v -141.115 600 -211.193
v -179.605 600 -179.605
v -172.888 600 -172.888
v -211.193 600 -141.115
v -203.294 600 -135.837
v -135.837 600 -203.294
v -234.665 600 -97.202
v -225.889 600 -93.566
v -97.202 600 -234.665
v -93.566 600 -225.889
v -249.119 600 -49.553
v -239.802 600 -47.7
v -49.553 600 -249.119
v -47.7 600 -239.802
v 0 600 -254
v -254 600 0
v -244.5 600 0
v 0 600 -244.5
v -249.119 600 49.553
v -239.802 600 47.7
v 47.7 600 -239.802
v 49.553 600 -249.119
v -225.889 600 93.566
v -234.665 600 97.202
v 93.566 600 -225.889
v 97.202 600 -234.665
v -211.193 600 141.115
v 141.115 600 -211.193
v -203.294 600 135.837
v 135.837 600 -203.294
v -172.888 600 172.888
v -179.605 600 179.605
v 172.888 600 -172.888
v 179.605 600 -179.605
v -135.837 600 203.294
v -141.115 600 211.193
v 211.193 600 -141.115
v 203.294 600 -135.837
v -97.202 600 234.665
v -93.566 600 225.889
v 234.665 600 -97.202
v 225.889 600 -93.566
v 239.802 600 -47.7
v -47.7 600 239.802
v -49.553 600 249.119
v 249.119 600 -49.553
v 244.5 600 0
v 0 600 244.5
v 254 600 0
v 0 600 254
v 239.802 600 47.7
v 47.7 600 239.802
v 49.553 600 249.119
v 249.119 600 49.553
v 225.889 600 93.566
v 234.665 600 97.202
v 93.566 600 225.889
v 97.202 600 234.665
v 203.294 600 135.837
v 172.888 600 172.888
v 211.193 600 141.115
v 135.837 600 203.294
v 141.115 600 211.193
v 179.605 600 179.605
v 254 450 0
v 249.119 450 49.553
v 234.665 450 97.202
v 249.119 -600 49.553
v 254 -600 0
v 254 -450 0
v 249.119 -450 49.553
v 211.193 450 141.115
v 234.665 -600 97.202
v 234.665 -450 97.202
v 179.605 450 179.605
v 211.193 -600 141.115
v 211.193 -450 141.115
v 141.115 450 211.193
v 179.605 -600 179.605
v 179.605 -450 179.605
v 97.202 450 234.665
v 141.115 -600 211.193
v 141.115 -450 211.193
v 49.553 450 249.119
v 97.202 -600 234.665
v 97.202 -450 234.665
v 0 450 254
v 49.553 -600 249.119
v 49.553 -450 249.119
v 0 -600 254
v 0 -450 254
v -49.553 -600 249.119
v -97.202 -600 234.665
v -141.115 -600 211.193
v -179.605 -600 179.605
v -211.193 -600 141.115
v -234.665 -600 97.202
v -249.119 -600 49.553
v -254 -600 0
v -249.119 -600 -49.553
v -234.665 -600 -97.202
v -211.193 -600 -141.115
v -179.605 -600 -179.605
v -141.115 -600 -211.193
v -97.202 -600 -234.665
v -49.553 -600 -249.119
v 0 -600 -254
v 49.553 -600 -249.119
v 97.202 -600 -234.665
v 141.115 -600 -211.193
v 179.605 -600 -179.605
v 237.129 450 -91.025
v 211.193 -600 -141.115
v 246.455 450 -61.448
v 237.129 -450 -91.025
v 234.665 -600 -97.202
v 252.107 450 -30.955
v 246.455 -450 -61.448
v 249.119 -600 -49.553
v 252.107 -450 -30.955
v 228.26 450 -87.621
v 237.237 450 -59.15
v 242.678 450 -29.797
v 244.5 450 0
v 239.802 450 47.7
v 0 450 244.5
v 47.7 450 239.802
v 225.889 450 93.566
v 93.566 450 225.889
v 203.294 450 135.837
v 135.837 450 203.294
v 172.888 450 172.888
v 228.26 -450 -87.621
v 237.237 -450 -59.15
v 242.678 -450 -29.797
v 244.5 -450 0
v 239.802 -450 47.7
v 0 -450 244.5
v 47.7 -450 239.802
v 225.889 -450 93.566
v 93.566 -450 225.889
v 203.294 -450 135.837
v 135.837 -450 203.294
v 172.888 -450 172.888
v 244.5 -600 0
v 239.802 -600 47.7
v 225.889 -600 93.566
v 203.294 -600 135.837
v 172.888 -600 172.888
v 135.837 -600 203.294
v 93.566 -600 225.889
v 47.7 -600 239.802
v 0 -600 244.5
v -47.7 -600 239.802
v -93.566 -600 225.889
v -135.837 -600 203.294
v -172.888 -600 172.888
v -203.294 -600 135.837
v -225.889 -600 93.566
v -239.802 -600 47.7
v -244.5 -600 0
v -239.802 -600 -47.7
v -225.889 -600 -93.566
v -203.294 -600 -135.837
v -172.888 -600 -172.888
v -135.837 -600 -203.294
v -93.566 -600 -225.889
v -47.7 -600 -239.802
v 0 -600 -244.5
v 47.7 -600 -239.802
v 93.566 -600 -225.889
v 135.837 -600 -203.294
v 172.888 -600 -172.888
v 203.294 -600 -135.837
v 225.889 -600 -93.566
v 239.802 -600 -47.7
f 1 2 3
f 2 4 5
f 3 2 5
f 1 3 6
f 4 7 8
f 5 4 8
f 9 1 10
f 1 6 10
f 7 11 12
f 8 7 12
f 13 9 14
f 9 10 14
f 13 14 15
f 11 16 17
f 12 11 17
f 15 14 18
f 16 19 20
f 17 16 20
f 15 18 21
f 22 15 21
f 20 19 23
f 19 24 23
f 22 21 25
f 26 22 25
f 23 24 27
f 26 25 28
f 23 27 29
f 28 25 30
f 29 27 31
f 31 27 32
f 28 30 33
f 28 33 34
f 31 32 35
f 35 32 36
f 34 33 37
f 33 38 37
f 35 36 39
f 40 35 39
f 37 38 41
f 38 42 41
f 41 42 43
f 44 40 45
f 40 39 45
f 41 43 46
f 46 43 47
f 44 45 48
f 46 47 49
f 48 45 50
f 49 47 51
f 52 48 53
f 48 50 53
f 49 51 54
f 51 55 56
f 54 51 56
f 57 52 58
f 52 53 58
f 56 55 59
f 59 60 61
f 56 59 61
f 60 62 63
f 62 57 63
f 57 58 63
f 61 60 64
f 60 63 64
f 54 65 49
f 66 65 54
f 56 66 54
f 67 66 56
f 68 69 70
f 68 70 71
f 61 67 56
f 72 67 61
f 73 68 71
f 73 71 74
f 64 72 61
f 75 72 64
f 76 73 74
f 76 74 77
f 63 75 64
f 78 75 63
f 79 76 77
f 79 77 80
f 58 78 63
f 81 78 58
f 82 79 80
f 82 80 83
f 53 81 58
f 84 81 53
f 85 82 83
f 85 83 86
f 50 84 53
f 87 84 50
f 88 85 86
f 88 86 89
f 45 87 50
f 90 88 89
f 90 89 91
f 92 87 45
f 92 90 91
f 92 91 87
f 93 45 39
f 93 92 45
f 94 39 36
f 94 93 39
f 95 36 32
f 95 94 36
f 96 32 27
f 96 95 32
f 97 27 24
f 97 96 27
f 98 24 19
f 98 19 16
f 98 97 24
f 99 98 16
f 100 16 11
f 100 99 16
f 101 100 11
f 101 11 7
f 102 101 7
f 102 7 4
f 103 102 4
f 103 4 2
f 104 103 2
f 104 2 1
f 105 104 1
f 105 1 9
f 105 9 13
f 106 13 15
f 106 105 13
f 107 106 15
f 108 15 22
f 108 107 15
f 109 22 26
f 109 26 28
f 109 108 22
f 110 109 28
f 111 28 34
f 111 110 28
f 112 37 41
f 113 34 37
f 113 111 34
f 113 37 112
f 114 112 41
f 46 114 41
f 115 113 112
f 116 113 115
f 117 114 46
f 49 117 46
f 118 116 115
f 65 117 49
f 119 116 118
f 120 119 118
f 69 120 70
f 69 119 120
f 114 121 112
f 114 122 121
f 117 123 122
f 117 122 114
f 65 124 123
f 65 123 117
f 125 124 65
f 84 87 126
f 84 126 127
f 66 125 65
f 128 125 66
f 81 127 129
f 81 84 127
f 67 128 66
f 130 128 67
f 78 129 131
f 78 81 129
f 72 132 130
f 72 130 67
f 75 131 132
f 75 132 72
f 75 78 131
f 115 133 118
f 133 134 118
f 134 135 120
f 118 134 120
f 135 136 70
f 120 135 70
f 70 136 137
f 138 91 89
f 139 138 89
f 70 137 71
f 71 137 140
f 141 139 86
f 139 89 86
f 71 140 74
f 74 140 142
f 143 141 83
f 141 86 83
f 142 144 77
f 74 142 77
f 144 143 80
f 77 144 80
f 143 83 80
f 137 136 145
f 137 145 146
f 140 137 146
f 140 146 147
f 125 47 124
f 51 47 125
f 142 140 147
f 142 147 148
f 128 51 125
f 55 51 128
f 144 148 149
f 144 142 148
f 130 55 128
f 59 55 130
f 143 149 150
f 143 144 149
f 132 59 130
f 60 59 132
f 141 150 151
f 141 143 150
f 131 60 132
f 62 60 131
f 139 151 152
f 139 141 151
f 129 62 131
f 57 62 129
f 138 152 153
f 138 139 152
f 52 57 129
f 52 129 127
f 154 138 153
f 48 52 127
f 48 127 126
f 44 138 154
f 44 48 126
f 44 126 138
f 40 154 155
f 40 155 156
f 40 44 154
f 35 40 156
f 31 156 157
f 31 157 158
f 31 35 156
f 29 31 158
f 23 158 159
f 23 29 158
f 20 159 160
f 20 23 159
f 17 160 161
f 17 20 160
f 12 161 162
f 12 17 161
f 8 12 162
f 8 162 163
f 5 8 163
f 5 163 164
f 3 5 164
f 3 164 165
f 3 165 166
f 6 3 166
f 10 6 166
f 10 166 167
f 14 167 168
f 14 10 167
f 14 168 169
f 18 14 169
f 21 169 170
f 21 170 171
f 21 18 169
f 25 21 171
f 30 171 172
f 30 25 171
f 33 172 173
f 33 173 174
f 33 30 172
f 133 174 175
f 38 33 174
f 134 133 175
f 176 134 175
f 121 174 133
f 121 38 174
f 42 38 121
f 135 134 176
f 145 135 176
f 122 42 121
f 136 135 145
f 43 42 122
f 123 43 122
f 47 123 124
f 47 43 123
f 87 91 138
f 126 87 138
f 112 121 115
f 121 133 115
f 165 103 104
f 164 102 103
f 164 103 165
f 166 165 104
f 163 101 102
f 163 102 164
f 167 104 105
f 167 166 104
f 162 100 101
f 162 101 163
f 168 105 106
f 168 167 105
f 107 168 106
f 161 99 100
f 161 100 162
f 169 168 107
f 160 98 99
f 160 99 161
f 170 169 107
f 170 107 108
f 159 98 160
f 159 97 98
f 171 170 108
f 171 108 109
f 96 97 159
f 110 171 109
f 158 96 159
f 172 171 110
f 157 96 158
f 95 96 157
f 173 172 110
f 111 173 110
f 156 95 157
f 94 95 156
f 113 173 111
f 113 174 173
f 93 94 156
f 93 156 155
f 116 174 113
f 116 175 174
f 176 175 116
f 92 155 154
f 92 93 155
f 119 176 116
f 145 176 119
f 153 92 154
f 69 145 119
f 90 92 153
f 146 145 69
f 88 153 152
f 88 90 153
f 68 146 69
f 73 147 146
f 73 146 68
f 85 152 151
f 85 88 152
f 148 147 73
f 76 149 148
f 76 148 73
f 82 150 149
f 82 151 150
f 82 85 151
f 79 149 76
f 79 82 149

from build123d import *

# Parameters (mm, degrees)
F0_R     = 254
F0_R_2   = 244.5
F1_DEPTH = 600
F3_DEPTH = 450


with BuildPart() as f1:
    # F0 (on Front) → F1 (new body, symmetric)
    with BuildSketch(Plane.XZ):
        Circle(F0_R)
        Circle(F0_R_2, mode=Mode.SUBTRACT)
    extrude(amount=F1_DEPTH, both=True)

    # F2 (on Front) → F3 (cut, symmetric)
    with BuildSketch(Plane.XZ):
        with BuildLine():
            ThreePointArc((237.1294283303, -91.0254591845), (209.32805191, 143.8671841789), (0, 254))
            Line((0, 254), (0, 244.5))
            ThreePointArc((0, 244.5), (201.4988531181, 138.4863249281), (228.2604142786, -87.6209636638))
            Line((228.2604142786, -87.6209636638), (237.1294283303, -91.0254591845))
        make_face()
        with BuildLine():
            ThreePointArc((228.2604142786, -87.6209636638), (201.4988531181, 138.4863249281), (0, 244.5))
            Line((0, 244.5), (0, 0))
            Line((0, 0), (228.2604142786, -87.6209636638))
        make_face()
    extrude(amount=F3_DEPTH, both=True, mode=Mode.SUBTRACT)


solid = f1.part
